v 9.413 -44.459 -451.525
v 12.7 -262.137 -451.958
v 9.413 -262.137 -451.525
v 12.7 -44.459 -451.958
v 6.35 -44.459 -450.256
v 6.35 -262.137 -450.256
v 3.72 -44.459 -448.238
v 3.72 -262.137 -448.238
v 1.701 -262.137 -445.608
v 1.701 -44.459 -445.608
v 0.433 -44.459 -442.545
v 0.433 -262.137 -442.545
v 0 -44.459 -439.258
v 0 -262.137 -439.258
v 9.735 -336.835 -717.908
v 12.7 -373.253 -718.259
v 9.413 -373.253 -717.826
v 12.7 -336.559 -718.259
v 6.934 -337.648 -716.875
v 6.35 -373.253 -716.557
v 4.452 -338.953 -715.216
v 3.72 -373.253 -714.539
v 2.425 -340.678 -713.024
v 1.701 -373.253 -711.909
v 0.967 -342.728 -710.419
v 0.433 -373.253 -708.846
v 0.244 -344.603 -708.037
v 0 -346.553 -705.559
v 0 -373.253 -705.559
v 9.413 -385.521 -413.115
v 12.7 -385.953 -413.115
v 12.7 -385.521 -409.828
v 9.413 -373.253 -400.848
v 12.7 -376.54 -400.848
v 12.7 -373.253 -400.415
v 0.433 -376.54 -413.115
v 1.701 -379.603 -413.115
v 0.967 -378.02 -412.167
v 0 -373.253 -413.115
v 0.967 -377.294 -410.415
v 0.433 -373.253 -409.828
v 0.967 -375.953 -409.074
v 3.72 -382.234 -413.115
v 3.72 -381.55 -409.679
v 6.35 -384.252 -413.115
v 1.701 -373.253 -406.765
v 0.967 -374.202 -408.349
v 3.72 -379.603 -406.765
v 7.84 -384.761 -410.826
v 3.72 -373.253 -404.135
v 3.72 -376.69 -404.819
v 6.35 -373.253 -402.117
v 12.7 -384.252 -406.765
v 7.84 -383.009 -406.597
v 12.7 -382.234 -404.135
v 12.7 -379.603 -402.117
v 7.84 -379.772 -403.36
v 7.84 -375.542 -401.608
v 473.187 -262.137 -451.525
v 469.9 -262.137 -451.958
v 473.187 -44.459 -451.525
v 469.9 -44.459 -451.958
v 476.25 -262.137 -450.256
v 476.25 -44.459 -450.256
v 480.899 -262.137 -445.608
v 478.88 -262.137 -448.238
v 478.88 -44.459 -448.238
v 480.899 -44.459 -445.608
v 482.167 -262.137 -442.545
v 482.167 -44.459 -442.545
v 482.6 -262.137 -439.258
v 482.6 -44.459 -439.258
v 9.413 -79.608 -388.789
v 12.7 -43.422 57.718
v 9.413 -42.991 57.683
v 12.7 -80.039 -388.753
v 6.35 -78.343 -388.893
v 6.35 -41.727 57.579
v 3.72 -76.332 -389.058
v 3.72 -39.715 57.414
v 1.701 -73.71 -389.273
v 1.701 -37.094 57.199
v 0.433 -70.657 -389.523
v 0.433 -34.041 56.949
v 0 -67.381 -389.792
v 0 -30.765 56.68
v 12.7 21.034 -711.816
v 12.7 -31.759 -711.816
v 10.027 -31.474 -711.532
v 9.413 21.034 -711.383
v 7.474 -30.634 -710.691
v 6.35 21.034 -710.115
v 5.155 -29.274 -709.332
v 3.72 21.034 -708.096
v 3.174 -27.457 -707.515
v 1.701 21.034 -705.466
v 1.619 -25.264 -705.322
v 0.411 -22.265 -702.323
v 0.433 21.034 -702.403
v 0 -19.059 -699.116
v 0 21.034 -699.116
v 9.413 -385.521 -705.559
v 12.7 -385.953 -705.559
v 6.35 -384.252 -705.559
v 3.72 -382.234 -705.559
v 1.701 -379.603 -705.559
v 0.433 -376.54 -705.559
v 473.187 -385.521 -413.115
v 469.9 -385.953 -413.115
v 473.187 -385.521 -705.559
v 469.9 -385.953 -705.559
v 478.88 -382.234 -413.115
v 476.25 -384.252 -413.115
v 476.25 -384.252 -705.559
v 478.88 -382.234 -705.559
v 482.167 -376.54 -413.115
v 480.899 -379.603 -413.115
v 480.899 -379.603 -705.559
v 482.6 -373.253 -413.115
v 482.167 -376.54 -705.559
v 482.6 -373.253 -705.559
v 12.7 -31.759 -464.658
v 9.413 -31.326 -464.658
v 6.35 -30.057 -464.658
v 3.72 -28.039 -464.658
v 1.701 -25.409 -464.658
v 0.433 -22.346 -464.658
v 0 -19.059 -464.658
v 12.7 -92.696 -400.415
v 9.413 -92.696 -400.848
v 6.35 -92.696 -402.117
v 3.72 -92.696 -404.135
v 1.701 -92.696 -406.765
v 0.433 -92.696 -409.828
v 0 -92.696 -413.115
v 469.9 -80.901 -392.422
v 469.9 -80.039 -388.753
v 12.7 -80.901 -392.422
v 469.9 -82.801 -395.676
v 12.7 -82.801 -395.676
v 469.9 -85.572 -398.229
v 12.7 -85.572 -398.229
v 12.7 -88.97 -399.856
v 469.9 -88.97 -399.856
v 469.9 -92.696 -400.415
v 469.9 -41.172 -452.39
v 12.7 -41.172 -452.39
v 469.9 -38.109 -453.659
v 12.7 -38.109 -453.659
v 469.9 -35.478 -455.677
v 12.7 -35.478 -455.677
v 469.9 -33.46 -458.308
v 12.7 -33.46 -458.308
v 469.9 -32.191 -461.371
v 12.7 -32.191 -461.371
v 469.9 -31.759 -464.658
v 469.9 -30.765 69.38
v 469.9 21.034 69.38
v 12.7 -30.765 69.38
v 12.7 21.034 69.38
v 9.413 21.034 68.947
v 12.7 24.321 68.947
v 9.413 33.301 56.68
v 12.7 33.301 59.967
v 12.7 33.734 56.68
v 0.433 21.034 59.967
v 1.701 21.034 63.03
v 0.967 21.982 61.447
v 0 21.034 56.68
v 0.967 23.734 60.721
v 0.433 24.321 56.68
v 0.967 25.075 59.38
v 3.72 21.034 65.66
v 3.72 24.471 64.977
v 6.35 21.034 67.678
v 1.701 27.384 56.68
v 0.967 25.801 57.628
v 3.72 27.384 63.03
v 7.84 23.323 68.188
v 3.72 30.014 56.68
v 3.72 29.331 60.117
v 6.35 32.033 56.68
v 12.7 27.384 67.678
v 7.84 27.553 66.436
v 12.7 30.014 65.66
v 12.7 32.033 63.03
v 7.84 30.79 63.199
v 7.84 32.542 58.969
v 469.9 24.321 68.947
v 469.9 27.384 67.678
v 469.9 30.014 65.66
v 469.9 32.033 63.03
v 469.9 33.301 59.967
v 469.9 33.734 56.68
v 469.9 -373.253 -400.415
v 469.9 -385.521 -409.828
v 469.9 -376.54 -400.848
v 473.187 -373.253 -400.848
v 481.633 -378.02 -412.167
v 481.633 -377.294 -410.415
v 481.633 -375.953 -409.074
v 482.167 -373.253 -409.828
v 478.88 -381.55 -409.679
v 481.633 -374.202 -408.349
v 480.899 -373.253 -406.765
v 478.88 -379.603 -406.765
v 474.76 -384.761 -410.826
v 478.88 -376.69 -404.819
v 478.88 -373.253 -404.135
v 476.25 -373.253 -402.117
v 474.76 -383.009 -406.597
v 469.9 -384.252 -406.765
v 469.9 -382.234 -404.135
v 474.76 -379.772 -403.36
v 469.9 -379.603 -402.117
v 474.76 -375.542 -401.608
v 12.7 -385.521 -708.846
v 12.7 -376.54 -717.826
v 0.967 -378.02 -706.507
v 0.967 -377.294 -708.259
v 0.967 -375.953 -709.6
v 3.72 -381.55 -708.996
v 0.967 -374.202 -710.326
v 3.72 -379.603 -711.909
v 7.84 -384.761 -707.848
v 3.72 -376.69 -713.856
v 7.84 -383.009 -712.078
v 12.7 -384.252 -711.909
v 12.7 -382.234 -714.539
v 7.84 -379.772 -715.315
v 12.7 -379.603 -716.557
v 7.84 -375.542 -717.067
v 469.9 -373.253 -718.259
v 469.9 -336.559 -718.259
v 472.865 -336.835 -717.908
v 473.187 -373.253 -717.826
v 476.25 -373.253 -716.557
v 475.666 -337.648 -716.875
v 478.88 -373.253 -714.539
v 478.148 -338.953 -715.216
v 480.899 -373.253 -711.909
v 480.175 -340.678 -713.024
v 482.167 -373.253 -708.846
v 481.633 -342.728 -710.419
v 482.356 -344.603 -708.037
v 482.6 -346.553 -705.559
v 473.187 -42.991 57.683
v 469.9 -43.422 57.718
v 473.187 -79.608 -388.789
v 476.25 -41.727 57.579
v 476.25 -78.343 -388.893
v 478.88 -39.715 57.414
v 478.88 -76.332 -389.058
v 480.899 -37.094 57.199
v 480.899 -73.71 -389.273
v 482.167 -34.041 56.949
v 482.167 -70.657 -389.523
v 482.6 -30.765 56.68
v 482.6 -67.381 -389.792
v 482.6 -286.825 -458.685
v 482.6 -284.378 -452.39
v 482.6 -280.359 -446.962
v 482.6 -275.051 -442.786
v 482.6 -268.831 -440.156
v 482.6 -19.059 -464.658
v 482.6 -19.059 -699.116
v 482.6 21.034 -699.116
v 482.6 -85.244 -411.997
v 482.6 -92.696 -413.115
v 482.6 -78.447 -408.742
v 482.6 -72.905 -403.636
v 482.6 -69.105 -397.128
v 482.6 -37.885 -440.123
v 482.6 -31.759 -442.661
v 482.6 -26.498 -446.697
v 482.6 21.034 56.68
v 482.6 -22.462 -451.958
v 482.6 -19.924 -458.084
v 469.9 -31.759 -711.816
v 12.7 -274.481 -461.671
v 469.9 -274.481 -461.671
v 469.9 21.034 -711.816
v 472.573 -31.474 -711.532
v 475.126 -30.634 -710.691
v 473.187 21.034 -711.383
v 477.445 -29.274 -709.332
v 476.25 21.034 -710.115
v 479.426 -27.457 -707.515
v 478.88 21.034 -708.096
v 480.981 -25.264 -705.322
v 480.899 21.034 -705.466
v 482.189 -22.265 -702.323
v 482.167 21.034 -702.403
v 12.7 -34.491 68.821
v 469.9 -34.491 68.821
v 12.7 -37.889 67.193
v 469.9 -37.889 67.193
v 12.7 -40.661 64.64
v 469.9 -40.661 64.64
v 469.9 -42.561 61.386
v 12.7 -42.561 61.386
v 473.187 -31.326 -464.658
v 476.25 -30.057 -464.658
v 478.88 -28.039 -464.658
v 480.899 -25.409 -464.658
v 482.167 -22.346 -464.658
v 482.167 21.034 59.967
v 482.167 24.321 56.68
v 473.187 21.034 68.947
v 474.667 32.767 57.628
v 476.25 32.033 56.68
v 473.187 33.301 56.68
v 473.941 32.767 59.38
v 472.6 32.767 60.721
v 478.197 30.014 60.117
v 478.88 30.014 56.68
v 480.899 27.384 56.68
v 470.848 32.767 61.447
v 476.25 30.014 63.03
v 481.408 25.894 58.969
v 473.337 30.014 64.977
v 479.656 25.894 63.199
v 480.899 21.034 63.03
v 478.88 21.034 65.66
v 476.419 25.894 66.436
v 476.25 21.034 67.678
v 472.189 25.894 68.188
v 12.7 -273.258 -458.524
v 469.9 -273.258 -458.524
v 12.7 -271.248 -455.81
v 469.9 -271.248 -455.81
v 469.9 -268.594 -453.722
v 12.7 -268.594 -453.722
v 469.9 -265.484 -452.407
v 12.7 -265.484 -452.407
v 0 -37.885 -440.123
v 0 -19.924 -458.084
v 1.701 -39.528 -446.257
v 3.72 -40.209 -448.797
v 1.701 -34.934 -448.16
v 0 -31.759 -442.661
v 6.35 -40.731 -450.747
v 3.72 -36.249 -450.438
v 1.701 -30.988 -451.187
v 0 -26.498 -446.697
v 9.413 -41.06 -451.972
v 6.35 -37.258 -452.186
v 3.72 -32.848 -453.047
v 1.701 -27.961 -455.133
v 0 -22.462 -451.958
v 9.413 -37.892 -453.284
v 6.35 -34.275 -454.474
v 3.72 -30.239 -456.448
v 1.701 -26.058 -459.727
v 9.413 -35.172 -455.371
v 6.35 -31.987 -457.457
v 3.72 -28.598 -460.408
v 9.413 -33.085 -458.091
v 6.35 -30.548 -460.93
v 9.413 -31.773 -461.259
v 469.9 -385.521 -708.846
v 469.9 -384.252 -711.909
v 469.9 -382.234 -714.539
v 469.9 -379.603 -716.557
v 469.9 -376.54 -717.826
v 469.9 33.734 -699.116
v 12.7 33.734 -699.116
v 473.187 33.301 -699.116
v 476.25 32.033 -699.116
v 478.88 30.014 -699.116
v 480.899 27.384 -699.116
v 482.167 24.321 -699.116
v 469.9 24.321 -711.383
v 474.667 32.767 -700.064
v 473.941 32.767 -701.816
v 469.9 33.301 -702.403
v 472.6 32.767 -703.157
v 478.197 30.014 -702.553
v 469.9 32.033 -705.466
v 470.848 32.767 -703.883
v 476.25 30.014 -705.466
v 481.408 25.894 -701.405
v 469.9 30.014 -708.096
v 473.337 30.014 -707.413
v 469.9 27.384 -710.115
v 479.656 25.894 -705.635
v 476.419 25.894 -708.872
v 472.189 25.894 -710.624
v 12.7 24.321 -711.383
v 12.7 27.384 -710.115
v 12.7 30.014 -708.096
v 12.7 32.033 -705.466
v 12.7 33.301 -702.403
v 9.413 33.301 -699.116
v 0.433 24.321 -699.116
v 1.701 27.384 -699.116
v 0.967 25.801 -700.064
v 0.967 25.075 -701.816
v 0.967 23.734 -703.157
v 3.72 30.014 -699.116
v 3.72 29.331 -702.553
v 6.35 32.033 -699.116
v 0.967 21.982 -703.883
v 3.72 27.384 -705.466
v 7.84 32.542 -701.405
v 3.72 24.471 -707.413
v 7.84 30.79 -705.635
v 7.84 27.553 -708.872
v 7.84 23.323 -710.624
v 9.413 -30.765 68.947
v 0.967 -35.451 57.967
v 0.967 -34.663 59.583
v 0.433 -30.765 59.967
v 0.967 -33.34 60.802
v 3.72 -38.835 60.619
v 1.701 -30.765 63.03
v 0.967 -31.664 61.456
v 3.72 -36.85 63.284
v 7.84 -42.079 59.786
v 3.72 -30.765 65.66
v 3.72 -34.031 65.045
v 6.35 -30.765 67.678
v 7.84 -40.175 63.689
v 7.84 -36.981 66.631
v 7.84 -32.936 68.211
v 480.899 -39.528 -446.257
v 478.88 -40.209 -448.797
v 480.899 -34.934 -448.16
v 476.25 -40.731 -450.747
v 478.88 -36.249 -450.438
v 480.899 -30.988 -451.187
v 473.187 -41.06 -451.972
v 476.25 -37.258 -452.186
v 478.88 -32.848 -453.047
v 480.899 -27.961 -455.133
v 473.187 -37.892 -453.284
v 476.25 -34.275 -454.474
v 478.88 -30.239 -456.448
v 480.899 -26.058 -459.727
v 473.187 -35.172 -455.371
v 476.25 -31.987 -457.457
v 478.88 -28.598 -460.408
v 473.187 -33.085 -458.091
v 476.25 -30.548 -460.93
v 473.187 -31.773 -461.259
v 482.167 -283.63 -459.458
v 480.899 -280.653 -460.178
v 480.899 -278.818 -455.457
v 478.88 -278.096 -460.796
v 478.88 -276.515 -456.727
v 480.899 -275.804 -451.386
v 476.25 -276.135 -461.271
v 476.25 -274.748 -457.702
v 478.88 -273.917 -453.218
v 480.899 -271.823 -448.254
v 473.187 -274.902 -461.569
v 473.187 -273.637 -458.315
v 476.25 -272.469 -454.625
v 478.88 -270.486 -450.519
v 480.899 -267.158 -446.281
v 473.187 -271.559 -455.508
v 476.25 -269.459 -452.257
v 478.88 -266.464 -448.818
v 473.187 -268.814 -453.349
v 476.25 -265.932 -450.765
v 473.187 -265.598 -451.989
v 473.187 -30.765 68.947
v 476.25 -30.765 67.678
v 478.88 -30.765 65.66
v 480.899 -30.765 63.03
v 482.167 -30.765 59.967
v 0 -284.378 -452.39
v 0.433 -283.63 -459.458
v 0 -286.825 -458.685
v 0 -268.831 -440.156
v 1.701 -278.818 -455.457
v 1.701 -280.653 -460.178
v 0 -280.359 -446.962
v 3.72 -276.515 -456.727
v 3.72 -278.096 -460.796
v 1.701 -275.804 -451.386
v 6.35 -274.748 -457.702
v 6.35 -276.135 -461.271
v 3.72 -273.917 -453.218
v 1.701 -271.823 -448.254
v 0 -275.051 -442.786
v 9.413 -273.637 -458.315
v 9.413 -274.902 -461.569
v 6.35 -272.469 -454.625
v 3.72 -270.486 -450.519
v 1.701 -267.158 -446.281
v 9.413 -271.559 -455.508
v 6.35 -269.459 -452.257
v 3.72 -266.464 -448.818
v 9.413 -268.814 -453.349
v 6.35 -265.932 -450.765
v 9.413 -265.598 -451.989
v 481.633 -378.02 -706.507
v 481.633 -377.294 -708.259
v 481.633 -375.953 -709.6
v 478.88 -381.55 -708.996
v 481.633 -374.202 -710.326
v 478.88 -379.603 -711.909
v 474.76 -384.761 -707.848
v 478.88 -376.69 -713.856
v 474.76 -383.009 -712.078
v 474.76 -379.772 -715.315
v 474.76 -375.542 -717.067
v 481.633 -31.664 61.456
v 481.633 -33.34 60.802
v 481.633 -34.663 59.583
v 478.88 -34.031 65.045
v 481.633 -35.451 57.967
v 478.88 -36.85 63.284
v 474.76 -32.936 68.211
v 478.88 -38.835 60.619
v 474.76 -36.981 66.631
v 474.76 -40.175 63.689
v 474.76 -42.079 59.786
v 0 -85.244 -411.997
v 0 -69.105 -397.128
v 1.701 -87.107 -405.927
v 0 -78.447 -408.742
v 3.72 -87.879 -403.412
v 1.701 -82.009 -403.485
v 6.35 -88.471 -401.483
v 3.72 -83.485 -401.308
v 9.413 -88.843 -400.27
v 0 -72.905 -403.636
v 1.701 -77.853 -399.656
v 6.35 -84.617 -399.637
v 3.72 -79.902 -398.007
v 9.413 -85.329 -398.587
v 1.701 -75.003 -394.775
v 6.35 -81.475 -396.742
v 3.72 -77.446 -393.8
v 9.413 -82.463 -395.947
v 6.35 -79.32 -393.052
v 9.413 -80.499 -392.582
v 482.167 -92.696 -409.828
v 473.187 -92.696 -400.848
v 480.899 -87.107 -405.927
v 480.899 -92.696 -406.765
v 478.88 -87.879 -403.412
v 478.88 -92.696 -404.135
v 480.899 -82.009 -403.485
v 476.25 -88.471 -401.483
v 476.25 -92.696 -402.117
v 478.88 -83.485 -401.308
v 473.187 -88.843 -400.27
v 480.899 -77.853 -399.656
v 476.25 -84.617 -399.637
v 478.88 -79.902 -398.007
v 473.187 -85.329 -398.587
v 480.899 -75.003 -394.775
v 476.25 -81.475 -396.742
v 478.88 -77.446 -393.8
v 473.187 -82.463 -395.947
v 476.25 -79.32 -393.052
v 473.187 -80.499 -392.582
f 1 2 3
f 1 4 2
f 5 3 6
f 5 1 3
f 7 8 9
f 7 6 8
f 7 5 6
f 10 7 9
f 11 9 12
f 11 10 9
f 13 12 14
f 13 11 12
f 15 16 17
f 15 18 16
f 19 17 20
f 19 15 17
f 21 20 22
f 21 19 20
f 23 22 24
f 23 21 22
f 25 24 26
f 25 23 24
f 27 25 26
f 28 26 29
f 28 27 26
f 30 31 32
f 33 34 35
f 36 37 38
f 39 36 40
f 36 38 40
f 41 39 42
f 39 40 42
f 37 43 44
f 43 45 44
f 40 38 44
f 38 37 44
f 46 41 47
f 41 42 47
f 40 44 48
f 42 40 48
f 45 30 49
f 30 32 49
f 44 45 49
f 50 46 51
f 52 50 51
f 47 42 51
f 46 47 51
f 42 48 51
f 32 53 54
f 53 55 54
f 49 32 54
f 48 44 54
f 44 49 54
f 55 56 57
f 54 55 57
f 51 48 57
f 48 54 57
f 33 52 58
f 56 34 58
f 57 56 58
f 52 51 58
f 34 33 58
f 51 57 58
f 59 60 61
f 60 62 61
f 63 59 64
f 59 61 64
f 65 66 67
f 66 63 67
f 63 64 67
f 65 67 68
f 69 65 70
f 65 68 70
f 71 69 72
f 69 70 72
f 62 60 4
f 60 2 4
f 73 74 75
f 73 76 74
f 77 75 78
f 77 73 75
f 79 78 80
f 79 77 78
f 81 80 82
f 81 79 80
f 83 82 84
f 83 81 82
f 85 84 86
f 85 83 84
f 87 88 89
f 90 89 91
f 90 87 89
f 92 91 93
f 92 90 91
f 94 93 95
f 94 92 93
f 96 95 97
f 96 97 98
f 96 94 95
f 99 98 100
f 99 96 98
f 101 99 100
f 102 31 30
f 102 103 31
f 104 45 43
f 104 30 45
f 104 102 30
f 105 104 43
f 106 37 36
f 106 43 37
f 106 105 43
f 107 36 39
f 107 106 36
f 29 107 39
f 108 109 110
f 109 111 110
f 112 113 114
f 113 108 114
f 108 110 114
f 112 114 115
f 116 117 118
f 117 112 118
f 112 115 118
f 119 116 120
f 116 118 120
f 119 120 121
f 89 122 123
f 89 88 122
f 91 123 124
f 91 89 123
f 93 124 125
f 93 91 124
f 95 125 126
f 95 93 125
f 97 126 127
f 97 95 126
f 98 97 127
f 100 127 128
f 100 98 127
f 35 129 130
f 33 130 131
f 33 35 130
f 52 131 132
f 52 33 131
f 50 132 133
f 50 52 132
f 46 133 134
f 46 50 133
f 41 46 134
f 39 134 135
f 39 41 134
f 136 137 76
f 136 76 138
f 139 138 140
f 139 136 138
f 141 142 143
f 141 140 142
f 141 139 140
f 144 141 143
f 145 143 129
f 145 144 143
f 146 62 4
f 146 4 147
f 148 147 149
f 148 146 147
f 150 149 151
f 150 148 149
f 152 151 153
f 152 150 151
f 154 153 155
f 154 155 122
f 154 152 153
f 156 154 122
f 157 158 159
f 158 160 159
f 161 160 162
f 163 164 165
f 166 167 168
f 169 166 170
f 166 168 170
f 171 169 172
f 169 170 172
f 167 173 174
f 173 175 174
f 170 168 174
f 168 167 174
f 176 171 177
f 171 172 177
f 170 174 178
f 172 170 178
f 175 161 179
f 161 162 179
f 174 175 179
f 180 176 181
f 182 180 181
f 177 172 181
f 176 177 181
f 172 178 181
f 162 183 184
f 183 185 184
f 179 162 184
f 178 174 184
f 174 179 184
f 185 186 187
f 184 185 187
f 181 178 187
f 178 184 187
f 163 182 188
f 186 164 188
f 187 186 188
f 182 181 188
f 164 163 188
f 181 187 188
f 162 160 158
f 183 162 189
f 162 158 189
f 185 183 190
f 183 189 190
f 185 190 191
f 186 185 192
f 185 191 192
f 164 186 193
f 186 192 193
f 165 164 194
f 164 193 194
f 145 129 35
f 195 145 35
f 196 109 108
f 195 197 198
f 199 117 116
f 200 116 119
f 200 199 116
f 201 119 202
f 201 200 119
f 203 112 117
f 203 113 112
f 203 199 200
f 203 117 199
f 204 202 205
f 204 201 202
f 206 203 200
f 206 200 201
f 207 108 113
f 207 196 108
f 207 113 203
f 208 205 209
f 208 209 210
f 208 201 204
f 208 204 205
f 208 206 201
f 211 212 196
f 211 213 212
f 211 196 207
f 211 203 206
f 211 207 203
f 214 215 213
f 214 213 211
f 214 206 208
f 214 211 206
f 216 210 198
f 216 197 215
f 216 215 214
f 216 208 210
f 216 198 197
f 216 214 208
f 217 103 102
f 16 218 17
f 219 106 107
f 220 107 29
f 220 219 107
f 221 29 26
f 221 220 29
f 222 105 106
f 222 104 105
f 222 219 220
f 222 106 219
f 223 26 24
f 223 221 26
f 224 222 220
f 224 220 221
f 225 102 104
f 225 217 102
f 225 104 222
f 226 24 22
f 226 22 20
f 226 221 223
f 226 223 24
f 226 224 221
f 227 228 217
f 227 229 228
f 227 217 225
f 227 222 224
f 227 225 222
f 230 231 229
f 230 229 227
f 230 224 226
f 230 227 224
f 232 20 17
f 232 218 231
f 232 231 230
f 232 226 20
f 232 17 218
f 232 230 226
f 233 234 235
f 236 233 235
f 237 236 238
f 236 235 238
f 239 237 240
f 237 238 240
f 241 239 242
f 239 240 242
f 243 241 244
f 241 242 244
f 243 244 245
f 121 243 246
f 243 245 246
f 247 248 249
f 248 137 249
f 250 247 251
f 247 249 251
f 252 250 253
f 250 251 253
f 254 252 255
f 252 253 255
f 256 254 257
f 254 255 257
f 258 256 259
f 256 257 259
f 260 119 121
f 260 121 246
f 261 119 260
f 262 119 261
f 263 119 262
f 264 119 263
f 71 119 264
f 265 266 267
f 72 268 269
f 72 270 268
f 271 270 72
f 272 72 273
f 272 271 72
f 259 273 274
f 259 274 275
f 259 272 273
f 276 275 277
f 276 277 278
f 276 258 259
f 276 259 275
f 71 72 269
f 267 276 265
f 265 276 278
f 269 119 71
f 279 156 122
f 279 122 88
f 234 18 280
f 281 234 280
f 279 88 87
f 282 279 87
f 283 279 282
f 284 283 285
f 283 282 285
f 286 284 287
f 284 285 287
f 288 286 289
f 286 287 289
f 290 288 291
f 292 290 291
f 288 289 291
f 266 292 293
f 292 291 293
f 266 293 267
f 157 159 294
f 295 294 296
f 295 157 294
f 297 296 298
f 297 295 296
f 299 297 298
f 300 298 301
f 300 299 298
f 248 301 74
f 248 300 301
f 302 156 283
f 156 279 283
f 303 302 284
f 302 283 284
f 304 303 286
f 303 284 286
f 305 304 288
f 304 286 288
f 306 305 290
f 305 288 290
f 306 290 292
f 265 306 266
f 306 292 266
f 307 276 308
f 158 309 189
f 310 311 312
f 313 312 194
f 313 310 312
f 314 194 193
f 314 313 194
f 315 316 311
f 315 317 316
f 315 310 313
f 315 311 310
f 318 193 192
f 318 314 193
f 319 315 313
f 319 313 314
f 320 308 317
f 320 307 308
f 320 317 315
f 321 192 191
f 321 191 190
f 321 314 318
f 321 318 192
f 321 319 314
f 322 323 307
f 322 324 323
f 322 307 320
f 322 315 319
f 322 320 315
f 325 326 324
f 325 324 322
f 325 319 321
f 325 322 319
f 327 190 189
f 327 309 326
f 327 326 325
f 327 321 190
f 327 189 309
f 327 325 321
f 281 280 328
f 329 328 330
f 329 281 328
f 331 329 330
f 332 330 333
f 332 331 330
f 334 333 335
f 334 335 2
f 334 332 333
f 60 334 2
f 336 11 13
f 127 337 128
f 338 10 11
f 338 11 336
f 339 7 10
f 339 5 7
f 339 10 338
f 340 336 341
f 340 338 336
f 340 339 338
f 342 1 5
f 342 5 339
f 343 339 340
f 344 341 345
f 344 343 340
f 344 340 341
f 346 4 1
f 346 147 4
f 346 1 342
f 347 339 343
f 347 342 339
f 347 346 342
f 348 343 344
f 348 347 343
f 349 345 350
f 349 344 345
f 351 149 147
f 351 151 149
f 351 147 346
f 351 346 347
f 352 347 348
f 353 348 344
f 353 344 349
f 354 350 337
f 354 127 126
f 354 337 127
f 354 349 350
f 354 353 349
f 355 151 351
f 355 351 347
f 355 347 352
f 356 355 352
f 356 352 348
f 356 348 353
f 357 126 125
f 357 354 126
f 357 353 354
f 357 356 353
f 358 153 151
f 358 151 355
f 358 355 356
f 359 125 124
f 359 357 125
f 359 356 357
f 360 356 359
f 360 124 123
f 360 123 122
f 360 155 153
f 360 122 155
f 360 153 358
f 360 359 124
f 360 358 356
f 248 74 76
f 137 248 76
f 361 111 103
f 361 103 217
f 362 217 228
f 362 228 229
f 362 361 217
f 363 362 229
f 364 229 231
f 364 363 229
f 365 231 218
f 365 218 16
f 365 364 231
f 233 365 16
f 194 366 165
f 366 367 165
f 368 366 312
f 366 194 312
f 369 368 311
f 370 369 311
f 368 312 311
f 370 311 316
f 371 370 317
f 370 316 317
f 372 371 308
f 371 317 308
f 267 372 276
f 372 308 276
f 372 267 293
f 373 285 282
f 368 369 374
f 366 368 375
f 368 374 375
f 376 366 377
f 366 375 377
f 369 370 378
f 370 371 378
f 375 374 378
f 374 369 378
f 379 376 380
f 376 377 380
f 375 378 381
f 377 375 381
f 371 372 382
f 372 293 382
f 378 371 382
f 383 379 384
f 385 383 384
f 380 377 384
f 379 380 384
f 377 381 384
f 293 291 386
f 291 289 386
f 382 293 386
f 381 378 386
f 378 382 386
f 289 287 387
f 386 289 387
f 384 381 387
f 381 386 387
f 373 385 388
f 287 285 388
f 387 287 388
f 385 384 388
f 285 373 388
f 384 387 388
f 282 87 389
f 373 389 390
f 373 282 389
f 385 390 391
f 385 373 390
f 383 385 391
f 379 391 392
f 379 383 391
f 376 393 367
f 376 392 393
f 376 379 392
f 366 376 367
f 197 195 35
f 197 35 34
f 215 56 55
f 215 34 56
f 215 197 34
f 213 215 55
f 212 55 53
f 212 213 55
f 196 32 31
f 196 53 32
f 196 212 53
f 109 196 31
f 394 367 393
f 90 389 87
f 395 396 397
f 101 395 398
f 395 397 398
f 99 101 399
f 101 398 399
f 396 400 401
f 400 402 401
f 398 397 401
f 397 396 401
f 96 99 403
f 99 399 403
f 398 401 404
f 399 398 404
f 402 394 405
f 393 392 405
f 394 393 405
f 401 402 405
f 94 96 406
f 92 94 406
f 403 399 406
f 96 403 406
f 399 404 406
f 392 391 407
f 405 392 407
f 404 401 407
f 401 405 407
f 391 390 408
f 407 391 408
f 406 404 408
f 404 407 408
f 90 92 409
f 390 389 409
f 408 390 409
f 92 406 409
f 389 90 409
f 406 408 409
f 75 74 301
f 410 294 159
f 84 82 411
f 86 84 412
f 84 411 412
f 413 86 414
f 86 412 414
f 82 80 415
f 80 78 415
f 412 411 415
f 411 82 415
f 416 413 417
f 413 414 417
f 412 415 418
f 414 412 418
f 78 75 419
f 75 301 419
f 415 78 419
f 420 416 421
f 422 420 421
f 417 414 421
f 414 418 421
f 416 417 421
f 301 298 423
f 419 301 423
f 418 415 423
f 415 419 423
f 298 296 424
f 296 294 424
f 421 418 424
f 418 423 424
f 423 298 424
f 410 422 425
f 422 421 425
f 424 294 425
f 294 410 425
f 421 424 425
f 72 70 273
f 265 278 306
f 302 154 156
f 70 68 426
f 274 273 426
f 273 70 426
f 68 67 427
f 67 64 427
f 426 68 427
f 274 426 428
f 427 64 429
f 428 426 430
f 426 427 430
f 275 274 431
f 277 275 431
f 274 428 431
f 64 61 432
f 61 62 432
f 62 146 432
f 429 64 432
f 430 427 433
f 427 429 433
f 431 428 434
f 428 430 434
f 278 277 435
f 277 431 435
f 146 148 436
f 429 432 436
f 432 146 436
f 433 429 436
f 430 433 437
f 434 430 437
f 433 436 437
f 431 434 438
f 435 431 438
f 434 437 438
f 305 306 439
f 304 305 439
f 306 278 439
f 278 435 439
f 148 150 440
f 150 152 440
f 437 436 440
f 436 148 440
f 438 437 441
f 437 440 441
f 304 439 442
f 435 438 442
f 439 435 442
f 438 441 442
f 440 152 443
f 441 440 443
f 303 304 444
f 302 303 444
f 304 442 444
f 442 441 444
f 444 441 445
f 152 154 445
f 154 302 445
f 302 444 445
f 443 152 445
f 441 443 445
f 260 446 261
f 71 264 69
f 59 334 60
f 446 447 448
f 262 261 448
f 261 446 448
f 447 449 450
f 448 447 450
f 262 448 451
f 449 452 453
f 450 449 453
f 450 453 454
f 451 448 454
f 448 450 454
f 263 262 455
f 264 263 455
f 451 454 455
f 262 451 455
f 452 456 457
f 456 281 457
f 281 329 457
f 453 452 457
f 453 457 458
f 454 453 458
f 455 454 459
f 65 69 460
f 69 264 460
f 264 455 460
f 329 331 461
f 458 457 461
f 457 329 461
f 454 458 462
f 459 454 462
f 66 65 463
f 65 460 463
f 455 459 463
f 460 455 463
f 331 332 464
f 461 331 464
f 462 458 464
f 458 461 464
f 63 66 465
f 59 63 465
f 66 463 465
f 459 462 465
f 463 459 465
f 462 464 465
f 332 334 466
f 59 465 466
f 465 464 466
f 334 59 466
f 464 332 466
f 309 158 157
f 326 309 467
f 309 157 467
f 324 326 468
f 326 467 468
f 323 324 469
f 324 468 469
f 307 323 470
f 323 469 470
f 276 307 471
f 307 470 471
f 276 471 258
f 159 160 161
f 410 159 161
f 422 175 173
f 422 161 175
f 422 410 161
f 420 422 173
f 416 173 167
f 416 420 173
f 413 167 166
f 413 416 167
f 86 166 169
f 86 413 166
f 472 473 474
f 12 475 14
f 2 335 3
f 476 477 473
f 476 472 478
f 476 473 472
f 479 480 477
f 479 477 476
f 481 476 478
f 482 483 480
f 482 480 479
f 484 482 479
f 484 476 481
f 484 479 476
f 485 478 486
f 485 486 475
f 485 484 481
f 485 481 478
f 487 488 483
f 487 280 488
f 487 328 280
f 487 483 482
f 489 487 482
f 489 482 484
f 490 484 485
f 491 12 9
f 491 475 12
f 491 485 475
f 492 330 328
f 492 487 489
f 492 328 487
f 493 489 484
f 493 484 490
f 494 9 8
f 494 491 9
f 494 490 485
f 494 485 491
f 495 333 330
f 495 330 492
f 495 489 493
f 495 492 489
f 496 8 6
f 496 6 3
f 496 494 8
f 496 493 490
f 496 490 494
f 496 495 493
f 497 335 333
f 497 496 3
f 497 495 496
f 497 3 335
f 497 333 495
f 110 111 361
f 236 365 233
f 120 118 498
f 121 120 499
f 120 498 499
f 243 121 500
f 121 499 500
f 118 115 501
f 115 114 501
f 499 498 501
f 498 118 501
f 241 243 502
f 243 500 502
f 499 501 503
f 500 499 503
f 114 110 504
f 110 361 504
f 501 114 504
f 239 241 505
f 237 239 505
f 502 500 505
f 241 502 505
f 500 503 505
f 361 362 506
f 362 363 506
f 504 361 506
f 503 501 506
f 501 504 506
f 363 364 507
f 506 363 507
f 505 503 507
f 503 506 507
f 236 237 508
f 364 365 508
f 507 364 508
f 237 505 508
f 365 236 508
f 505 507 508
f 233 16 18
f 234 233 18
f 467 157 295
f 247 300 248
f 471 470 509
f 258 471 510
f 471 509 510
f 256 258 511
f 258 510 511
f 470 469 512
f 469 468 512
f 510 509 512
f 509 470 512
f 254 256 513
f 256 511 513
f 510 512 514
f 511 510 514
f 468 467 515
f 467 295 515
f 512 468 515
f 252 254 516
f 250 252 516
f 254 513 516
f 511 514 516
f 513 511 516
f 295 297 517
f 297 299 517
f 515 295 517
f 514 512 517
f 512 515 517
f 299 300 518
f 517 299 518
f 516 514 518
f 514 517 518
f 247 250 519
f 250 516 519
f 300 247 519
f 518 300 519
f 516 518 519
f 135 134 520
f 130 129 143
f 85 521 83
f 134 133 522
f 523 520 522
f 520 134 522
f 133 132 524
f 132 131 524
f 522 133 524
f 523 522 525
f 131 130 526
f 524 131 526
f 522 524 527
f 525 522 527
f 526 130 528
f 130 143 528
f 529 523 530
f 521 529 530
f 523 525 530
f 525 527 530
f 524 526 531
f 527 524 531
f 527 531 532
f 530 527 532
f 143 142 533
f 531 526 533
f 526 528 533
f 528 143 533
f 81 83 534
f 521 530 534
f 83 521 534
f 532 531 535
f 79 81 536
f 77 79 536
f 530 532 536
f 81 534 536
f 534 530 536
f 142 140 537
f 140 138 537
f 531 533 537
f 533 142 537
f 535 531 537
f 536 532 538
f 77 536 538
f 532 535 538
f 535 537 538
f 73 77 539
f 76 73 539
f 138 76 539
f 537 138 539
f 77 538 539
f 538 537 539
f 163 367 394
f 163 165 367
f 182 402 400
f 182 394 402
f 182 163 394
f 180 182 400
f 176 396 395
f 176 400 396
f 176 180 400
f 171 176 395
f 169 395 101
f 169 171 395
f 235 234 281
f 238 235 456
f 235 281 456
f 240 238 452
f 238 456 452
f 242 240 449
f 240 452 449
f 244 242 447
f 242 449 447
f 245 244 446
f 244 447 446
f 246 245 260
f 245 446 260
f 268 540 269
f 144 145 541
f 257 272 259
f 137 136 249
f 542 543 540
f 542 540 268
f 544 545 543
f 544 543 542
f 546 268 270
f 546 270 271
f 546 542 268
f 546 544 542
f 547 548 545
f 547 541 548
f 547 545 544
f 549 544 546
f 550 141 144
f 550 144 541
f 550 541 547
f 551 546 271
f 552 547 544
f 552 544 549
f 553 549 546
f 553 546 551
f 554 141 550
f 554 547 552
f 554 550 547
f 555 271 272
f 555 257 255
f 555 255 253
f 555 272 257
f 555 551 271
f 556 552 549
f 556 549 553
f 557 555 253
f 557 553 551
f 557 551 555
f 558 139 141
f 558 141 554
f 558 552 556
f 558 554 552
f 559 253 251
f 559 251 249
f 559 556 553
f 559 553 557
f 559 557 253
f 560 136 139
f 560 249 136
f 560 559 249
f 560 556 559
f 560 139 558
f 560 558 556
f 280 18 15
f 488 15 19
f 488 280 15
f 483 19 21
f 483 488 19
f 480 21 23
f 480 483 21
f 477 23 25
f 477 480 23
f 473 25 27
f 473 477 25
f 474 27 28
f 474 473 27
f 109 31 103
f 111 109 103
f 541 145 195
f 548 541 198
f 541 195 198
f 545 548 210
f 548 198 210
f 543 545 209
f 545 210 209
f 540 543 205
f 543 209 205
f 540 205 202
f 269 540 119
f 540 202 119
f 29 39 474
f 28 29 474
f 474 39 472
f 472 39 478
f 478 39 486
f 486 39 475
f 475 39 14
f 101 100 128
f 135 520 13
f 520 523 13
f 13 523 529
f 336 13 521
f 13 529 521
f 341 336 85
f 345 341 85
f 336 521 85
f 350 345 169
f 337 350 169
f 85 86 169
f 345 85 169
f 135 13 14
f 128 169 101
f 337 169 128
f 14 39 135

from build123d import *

# Parameters (mm, degrees)
F1_DEPTH = 482.6
F2_R     = 12.7


with BuildPart() as f1:
    # F0 (on Right) → F1 (new body)
    with BuildSketch(Plane.YZ):
        Polygon((33.734092, 69.37997), (-42.465908, 69.37997), (-80.995351, -400.415391), (-385.953367, -400.415391), (-385.953367, -718.258917), (-336.558729, -718.258917), (-272.130996, -451.957613), (-31.758729, -451.957613), (-31.758729, -711.816192), (33.734092, -711.816192), align=None)
    extrude(amount=F1_DEPTH)

    # F2
    f2_edges = [f1.edges().sort_by_distance(p)[0] for p in [
        (241.3, -385.953367, -400.415391),
        (241.3, -385.953367, -718.258917),
        (0, -385.953367, -559.337154),
        (482.6, -385.953367, -559.337154),
        (241.3, -80.995351, -400.415391),
        (0, -233.474359, -400.415391),
        (482.6, -233.474359, -400.415391),
        (482.6, -4.365908, 69.37997),
        (482.6, -61.730629, -165.51771),
        (482.6, -361.256048, -718.258917),
        (482.6, -304.344863, -585.108265),
        (482.6, -151.944863, -451.957613),
        (482.6, -31.758729, -581.886902),
        (482.6, 0.987682, -711.816192),
        (482.6, 33.734092, -321.218111),
        (241.3, -42.465908, 69.37997),
        (0, -61.730629, -165.51771),
        (241.3, 33.734092, 69.37997),
        (0, -4.365908, 69.37997),
        (241.3, 33.734092, -711.816192),
        (0, 33.734092, -321.218111),
        (0, -361.256048, -718.258917),
        (0, -304.344863, -585.108265),
        (0, -151.944863, -451.957613),
        (0, -31.758729, -581.886902),
        (0, 0.987682, -711.816192),
        (241.3, -272.130996, -451.957613),
        (241.3, -31.758729, -451.957613),
    ]]
    fillet(f2_edges, radius=F2_R)


solid = f1.part
